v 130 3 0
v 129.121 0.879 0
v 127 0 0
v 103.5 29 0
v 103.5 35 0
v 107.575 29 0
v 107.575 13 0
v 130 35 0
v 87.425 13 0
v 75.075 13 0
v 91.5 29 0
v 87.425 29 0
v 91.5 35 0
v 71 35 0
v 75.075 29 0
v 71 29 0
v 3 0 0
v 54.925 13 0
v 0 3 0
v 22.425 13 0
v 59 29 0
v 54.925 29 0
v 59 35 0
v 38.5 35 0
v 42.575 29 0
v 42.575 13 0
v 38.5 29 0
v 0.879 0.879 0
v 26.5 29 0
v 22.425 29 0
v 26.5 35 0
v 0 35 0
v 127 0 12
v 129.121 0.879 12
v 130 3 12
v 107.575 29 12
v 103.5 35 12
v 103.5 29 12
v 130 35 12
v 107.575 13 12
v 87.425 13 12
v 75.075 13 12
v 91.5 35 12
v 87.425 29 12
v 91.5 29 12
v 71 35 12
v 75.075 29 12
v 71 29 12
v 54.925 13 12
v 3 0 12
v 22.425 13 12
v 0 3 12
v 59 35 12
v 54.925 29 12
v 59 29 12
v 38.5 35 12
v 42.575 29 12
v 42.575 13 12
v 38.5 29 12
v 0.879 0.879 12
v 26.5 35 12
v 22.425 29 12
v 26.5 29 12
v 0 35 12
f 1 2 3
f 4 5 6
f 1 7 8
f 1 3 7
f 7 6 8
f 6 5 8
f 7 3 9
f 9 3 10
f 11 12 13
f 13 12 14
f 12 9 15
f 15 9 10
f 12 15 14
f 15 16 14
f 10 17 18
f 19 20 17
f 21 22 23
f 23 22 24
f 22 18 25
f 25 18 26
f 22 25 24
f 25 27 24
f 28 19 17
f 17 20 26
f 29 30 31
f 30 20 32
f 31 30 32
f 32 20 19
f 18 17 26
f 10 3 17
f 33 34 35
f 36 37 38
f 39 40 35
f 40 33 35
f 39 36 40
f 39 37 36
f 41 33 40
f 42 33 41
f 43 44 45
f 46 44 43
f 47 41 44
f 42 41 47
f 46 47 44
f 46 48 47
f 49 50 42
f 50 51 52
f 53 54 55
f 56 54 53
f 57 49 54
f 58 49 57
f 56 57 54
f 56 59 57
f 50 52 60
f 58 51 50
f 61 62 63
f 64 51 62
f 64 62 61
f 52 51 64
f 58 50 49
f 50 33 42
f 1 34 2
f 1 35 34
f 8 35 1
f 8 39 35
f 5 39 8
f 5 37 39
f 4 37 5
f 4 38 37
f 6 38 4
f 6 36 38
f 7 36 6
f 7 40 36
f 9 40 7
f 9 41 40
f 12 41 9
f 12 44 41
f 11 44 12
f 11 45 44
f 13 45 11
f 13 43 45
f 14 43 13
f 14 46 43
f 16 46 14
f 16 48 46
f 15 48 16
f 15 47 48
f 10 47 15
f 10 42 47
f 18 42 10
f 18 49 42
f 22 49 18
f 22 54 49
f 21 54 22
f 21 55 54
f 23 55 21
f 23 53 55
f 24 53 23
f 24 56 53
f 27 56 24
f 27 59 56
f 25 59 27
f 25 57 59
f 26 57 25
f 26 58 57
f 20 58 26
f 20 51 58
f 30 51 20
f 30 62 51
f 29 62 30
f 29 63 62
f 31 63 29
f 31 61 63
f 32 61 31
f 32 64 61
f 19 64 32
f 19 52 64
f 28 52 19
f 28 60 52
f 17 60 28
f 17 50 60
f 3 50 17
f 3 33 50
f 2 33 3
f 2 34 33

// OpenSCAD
$fn = 32;

// ----------------------------------------------------------------------
// Window plate: 130 x 35 mm, 3 open windows
// ----------------------------------------------------------------------

// --- parameters (mm) ---
profile_height = 12;      // extrusion height
profile_points = 32;      // points of the closed outline

profile = [[0, 3], [0.879, 0.879], [3, 0], [127, 0], [129.121, 0.879], [130, 3], [130, 35], [103.5, 35], [103.5, 29], [107.575, 29], [107.575, 13], [87.425, 13], [87.425, 29], [91.5, 29], [91.5, 35], [71, 35], [71, 29], [75.075, 29], [75.075, 13], [54.925, 13], [54.925, 29], [59, 29], [59, 35], [38.5, 35], [38.5, 29], [42.575, 29], [42.575, 13], [22.425, 13], [22.425, 29], [26.5, 29], [26.5, 35], [0, 35]];  // single closed polygon, 32 points, counter clockwise

// --- the one profile operation ---
linear_extrude(height = profile_height) polygon(points = profile);
